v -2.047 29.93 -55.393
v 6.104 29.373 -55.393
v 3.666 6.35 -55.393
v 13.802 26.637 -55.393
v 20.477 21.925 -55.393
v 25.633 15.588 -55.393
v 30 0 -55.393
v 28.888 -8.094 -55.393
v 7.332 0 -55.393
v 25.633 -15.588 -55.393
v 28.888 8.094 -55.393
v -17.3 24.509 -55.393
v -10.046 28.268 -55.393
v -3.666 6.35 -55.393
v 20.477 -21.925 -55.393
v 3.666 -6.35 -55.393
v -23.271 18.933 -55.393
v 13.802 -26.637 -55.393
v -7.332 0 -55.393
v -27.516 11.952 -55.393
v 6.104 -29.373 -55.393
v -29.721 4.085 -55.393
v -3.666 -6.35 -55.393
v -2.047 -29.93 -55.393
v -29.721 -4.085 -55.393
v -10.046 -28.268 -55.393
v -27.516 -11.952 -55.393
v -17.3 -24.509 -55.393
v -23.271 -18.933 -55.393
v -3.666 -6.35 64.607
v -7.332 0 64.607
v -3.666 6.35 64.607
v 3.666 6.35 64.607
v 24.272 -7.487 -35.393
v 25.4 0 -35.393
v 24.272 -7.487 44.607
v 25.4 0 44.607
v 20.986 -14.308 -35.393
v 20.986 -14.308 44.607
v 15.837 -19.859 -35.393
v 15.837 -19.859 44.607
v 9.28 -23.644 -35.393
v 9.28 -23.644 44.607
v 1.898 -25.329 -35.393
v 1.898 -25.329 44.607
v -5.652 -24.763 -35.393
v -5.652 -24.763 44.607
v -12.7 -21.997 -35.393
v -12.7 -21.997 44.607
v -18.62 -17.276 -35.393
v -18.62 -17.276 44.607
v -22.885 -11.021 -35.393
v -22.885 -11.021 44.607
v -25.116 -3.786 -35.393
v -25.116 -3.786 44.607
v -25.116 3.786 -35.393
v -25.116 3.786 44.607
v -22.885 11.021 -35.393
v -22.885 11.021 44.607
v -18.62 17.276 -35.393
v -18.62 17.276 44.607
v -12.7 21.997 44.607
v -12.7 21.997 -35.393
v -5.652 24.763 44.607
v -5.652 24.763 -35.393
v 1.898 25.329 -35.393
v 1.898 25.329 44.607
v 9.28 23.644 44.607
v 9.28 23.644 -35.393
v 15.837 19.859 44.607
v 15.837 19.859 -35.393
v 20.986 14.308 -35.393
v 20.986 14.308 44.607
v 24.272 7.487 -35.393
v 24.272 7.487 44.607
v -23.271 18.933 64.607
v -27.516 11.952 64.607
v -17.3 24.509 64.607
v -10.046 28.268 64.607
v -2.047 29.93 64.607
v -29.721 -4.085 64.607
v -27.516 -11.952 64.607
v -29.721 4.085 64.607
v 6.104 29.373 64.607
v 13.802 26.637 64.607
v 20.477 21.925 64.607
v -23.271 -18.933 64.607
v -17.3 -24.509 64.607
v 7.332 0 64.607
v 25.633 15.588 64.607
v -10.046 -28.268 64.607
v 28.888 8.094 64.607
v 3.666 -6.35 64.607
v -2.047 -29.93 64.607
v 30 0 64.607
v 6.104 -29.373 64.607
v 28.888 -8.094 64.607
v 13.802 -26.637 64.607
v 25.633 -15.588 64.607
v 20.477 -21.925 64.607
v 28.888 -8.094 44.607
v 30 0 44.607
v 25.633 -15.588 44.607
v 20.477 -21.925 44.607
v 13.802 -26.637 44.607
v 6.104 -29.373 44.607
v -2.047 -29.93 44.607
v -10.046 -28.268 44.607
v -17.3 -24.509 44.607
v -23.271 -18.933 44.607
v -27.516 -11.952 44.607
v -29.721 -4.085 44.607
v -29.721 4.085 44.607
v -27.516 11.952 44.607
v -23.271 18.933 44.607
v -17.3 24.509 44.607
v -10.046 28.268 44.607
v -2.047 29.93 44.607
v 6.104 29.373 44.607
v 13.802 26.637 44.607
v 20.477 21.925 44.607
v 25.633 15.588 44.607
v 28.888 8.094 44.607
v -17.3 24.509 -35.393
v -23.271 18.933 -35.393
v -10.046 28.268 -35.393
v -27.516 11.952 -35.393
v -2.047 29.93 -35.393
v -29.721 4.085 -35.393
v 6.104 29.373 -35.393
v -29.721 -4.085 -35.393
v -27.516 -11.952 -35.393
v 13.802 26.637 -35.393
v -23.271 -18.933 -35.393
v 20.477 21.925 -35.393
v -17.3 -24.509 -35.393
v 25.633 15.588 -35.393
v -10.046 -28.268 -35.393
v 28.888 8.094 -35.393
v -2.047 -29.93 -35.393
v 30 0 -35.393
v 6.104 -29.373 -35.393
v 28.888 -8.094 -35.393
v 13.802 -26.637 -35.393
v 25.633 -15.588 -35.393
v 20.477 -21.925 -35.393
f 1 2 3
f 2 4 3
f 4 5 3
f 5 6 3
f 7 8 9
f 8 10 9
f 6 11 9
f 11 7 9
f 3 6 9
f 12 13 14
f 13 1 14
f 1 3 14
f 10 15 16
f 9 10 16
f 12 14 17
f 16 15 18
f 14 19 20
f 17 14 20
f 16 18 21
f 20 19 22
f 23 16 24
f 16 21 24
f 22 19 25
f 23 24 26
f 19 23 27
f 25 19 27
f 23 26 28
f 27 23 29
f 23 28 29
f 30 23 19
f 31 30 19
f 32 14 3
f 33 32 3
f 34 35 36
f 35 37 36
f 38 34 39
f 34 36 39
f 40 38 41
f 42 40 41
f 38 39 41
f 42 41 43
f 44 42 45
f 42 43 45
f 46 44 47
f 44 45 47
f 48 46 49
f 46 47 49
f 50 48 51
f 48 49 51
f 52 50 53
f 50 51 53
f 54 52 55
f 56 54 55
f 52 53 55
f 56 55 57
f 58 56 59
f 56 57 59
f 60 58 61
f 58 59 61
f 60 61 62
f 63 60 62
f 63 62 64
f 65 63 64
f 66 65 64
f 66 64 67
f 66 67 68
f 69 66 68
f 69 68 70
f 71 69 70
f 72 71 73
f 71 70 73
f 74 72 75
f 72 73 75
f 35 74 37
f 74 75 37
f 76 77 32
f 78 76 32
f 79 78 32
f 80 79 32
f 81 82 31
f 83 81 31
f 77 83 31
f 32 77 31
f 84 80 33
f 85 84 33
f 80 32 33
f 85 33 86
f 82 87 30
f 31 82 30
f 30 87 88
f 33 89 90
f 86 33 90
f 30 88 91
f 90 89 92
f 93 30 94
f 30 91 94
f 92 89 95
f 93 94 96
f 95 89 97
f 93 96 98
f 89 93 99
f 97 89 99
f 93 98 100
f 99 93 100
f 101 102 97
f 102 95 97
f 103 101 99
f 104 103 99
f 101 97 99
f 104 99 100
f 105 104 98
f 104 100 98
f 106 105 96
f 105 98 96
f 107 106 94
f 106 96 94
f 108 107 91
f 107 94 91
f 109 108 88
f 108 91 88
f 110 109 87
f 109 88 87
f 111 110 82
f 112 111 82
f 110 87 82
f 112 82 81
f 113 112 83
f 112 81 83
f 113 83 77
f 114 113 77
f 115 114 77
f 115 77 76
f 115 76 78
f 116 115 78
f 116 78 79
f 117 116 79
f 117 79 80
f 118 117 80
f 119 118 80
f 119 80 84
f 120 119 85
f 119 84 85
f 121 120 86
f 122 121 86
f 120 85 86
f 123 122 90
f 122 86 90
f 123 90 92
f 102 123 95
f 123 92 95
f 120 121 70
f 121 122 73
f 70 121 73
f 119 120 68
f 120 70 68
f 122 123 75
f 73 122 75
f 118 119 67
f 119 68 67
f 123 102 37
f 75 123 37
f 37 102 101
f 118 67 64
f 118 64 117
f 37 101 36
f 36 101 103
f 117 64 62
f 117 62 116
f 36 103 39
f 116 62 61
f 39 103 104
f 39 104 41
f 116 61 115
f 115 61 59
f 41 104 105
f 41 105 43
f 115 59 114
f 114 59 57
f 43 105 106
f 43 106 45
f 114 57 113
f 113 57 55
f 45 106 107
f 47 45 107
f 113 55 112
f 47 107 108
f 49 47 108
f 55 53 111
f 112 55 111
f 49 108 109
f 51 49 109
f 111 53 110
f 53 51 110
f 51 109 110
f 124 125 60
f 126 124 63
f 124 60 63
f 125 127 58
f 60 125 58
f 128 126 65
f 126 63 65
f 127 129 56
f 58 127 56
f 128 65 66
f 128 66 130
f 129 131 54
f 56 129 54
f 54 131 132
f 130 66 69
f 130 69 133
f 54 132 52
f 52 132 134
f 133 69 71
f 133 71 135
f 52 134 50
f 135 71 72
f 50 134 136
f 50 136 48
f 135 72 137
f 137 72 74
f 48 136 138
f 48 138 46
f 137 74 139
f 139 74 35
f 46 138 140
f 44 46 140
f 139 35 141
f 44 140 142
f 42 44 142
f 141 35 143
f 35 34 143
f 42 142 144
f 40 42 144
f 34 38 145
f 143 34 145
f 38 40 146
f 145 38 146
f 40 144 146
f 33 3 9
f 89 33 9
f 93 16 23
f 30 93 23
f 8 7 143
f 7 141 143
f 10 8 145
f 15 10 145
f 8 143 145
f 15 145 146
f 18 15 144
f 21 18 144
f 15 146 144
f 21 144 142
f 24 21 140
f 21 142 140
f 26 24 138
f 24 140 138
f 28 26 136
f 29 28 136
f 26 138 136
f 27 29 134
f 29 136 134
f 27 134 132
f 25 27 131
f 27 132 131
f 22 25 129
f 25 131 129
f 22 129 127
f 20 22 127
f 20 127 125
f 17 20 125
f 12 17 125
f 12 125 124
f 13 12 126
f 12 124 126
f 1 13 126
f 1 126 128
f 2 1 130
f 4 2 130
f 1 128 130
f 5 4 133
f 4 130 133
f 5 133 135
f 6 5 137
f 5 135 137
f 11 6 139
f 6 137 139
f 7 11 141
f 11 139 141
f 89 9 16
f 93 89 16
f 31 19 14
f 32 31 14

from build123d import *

# Parameters (mm, degrees)
CORTAR_EXTRUIR1_DEPTH = 128.279220614


with BuildPart() as part:
    # Croquis1 → Revolución1 (revolve)
    with BuildSketch(Plane(origin=(0, 0, 0), x_dir=(1, 0, 0), z_dir=(0, 1, 0)), mode=Mode.PRIVATE) as revoluci_n1_sk:
        Polygon((0, 55.393258427), (-30, 55.393258427), (-30, 35.393258427), (-25.4, 35.393258427), (-25.4, -44.606741573), (-30, -44.606741573), (-30, -64.606741573), (0, -64.606741573), align=None)
    revolve(revoluci_n1_sk.sketch.rotate(Axis((0, 0, 64.606741573), (0, 0, -1)), 180), axis=Axis((0, 0, 64.606741573), (0, 0, -1)))

    # Croquis2 → Cortar-Extruir1 (cut, through all)
    with BuildSketch(Plane(origin=(0, 0, -55.393258427), x_dir=(-1, 0, 0), z_dir=(0, 0, -1))):
        Polygon((7.332348419, 0), (3.666174209, 6.35), (-3.666174209, 6.35), (-7.332348419, 0), (-3.666174209, -6.35), (3.666174209, -6.35), align=None)
    extrude(amount=-CORTAR_EXTRUIR1_DEPTH, mode=Mode.SUBTRACT)


solid = part.part
